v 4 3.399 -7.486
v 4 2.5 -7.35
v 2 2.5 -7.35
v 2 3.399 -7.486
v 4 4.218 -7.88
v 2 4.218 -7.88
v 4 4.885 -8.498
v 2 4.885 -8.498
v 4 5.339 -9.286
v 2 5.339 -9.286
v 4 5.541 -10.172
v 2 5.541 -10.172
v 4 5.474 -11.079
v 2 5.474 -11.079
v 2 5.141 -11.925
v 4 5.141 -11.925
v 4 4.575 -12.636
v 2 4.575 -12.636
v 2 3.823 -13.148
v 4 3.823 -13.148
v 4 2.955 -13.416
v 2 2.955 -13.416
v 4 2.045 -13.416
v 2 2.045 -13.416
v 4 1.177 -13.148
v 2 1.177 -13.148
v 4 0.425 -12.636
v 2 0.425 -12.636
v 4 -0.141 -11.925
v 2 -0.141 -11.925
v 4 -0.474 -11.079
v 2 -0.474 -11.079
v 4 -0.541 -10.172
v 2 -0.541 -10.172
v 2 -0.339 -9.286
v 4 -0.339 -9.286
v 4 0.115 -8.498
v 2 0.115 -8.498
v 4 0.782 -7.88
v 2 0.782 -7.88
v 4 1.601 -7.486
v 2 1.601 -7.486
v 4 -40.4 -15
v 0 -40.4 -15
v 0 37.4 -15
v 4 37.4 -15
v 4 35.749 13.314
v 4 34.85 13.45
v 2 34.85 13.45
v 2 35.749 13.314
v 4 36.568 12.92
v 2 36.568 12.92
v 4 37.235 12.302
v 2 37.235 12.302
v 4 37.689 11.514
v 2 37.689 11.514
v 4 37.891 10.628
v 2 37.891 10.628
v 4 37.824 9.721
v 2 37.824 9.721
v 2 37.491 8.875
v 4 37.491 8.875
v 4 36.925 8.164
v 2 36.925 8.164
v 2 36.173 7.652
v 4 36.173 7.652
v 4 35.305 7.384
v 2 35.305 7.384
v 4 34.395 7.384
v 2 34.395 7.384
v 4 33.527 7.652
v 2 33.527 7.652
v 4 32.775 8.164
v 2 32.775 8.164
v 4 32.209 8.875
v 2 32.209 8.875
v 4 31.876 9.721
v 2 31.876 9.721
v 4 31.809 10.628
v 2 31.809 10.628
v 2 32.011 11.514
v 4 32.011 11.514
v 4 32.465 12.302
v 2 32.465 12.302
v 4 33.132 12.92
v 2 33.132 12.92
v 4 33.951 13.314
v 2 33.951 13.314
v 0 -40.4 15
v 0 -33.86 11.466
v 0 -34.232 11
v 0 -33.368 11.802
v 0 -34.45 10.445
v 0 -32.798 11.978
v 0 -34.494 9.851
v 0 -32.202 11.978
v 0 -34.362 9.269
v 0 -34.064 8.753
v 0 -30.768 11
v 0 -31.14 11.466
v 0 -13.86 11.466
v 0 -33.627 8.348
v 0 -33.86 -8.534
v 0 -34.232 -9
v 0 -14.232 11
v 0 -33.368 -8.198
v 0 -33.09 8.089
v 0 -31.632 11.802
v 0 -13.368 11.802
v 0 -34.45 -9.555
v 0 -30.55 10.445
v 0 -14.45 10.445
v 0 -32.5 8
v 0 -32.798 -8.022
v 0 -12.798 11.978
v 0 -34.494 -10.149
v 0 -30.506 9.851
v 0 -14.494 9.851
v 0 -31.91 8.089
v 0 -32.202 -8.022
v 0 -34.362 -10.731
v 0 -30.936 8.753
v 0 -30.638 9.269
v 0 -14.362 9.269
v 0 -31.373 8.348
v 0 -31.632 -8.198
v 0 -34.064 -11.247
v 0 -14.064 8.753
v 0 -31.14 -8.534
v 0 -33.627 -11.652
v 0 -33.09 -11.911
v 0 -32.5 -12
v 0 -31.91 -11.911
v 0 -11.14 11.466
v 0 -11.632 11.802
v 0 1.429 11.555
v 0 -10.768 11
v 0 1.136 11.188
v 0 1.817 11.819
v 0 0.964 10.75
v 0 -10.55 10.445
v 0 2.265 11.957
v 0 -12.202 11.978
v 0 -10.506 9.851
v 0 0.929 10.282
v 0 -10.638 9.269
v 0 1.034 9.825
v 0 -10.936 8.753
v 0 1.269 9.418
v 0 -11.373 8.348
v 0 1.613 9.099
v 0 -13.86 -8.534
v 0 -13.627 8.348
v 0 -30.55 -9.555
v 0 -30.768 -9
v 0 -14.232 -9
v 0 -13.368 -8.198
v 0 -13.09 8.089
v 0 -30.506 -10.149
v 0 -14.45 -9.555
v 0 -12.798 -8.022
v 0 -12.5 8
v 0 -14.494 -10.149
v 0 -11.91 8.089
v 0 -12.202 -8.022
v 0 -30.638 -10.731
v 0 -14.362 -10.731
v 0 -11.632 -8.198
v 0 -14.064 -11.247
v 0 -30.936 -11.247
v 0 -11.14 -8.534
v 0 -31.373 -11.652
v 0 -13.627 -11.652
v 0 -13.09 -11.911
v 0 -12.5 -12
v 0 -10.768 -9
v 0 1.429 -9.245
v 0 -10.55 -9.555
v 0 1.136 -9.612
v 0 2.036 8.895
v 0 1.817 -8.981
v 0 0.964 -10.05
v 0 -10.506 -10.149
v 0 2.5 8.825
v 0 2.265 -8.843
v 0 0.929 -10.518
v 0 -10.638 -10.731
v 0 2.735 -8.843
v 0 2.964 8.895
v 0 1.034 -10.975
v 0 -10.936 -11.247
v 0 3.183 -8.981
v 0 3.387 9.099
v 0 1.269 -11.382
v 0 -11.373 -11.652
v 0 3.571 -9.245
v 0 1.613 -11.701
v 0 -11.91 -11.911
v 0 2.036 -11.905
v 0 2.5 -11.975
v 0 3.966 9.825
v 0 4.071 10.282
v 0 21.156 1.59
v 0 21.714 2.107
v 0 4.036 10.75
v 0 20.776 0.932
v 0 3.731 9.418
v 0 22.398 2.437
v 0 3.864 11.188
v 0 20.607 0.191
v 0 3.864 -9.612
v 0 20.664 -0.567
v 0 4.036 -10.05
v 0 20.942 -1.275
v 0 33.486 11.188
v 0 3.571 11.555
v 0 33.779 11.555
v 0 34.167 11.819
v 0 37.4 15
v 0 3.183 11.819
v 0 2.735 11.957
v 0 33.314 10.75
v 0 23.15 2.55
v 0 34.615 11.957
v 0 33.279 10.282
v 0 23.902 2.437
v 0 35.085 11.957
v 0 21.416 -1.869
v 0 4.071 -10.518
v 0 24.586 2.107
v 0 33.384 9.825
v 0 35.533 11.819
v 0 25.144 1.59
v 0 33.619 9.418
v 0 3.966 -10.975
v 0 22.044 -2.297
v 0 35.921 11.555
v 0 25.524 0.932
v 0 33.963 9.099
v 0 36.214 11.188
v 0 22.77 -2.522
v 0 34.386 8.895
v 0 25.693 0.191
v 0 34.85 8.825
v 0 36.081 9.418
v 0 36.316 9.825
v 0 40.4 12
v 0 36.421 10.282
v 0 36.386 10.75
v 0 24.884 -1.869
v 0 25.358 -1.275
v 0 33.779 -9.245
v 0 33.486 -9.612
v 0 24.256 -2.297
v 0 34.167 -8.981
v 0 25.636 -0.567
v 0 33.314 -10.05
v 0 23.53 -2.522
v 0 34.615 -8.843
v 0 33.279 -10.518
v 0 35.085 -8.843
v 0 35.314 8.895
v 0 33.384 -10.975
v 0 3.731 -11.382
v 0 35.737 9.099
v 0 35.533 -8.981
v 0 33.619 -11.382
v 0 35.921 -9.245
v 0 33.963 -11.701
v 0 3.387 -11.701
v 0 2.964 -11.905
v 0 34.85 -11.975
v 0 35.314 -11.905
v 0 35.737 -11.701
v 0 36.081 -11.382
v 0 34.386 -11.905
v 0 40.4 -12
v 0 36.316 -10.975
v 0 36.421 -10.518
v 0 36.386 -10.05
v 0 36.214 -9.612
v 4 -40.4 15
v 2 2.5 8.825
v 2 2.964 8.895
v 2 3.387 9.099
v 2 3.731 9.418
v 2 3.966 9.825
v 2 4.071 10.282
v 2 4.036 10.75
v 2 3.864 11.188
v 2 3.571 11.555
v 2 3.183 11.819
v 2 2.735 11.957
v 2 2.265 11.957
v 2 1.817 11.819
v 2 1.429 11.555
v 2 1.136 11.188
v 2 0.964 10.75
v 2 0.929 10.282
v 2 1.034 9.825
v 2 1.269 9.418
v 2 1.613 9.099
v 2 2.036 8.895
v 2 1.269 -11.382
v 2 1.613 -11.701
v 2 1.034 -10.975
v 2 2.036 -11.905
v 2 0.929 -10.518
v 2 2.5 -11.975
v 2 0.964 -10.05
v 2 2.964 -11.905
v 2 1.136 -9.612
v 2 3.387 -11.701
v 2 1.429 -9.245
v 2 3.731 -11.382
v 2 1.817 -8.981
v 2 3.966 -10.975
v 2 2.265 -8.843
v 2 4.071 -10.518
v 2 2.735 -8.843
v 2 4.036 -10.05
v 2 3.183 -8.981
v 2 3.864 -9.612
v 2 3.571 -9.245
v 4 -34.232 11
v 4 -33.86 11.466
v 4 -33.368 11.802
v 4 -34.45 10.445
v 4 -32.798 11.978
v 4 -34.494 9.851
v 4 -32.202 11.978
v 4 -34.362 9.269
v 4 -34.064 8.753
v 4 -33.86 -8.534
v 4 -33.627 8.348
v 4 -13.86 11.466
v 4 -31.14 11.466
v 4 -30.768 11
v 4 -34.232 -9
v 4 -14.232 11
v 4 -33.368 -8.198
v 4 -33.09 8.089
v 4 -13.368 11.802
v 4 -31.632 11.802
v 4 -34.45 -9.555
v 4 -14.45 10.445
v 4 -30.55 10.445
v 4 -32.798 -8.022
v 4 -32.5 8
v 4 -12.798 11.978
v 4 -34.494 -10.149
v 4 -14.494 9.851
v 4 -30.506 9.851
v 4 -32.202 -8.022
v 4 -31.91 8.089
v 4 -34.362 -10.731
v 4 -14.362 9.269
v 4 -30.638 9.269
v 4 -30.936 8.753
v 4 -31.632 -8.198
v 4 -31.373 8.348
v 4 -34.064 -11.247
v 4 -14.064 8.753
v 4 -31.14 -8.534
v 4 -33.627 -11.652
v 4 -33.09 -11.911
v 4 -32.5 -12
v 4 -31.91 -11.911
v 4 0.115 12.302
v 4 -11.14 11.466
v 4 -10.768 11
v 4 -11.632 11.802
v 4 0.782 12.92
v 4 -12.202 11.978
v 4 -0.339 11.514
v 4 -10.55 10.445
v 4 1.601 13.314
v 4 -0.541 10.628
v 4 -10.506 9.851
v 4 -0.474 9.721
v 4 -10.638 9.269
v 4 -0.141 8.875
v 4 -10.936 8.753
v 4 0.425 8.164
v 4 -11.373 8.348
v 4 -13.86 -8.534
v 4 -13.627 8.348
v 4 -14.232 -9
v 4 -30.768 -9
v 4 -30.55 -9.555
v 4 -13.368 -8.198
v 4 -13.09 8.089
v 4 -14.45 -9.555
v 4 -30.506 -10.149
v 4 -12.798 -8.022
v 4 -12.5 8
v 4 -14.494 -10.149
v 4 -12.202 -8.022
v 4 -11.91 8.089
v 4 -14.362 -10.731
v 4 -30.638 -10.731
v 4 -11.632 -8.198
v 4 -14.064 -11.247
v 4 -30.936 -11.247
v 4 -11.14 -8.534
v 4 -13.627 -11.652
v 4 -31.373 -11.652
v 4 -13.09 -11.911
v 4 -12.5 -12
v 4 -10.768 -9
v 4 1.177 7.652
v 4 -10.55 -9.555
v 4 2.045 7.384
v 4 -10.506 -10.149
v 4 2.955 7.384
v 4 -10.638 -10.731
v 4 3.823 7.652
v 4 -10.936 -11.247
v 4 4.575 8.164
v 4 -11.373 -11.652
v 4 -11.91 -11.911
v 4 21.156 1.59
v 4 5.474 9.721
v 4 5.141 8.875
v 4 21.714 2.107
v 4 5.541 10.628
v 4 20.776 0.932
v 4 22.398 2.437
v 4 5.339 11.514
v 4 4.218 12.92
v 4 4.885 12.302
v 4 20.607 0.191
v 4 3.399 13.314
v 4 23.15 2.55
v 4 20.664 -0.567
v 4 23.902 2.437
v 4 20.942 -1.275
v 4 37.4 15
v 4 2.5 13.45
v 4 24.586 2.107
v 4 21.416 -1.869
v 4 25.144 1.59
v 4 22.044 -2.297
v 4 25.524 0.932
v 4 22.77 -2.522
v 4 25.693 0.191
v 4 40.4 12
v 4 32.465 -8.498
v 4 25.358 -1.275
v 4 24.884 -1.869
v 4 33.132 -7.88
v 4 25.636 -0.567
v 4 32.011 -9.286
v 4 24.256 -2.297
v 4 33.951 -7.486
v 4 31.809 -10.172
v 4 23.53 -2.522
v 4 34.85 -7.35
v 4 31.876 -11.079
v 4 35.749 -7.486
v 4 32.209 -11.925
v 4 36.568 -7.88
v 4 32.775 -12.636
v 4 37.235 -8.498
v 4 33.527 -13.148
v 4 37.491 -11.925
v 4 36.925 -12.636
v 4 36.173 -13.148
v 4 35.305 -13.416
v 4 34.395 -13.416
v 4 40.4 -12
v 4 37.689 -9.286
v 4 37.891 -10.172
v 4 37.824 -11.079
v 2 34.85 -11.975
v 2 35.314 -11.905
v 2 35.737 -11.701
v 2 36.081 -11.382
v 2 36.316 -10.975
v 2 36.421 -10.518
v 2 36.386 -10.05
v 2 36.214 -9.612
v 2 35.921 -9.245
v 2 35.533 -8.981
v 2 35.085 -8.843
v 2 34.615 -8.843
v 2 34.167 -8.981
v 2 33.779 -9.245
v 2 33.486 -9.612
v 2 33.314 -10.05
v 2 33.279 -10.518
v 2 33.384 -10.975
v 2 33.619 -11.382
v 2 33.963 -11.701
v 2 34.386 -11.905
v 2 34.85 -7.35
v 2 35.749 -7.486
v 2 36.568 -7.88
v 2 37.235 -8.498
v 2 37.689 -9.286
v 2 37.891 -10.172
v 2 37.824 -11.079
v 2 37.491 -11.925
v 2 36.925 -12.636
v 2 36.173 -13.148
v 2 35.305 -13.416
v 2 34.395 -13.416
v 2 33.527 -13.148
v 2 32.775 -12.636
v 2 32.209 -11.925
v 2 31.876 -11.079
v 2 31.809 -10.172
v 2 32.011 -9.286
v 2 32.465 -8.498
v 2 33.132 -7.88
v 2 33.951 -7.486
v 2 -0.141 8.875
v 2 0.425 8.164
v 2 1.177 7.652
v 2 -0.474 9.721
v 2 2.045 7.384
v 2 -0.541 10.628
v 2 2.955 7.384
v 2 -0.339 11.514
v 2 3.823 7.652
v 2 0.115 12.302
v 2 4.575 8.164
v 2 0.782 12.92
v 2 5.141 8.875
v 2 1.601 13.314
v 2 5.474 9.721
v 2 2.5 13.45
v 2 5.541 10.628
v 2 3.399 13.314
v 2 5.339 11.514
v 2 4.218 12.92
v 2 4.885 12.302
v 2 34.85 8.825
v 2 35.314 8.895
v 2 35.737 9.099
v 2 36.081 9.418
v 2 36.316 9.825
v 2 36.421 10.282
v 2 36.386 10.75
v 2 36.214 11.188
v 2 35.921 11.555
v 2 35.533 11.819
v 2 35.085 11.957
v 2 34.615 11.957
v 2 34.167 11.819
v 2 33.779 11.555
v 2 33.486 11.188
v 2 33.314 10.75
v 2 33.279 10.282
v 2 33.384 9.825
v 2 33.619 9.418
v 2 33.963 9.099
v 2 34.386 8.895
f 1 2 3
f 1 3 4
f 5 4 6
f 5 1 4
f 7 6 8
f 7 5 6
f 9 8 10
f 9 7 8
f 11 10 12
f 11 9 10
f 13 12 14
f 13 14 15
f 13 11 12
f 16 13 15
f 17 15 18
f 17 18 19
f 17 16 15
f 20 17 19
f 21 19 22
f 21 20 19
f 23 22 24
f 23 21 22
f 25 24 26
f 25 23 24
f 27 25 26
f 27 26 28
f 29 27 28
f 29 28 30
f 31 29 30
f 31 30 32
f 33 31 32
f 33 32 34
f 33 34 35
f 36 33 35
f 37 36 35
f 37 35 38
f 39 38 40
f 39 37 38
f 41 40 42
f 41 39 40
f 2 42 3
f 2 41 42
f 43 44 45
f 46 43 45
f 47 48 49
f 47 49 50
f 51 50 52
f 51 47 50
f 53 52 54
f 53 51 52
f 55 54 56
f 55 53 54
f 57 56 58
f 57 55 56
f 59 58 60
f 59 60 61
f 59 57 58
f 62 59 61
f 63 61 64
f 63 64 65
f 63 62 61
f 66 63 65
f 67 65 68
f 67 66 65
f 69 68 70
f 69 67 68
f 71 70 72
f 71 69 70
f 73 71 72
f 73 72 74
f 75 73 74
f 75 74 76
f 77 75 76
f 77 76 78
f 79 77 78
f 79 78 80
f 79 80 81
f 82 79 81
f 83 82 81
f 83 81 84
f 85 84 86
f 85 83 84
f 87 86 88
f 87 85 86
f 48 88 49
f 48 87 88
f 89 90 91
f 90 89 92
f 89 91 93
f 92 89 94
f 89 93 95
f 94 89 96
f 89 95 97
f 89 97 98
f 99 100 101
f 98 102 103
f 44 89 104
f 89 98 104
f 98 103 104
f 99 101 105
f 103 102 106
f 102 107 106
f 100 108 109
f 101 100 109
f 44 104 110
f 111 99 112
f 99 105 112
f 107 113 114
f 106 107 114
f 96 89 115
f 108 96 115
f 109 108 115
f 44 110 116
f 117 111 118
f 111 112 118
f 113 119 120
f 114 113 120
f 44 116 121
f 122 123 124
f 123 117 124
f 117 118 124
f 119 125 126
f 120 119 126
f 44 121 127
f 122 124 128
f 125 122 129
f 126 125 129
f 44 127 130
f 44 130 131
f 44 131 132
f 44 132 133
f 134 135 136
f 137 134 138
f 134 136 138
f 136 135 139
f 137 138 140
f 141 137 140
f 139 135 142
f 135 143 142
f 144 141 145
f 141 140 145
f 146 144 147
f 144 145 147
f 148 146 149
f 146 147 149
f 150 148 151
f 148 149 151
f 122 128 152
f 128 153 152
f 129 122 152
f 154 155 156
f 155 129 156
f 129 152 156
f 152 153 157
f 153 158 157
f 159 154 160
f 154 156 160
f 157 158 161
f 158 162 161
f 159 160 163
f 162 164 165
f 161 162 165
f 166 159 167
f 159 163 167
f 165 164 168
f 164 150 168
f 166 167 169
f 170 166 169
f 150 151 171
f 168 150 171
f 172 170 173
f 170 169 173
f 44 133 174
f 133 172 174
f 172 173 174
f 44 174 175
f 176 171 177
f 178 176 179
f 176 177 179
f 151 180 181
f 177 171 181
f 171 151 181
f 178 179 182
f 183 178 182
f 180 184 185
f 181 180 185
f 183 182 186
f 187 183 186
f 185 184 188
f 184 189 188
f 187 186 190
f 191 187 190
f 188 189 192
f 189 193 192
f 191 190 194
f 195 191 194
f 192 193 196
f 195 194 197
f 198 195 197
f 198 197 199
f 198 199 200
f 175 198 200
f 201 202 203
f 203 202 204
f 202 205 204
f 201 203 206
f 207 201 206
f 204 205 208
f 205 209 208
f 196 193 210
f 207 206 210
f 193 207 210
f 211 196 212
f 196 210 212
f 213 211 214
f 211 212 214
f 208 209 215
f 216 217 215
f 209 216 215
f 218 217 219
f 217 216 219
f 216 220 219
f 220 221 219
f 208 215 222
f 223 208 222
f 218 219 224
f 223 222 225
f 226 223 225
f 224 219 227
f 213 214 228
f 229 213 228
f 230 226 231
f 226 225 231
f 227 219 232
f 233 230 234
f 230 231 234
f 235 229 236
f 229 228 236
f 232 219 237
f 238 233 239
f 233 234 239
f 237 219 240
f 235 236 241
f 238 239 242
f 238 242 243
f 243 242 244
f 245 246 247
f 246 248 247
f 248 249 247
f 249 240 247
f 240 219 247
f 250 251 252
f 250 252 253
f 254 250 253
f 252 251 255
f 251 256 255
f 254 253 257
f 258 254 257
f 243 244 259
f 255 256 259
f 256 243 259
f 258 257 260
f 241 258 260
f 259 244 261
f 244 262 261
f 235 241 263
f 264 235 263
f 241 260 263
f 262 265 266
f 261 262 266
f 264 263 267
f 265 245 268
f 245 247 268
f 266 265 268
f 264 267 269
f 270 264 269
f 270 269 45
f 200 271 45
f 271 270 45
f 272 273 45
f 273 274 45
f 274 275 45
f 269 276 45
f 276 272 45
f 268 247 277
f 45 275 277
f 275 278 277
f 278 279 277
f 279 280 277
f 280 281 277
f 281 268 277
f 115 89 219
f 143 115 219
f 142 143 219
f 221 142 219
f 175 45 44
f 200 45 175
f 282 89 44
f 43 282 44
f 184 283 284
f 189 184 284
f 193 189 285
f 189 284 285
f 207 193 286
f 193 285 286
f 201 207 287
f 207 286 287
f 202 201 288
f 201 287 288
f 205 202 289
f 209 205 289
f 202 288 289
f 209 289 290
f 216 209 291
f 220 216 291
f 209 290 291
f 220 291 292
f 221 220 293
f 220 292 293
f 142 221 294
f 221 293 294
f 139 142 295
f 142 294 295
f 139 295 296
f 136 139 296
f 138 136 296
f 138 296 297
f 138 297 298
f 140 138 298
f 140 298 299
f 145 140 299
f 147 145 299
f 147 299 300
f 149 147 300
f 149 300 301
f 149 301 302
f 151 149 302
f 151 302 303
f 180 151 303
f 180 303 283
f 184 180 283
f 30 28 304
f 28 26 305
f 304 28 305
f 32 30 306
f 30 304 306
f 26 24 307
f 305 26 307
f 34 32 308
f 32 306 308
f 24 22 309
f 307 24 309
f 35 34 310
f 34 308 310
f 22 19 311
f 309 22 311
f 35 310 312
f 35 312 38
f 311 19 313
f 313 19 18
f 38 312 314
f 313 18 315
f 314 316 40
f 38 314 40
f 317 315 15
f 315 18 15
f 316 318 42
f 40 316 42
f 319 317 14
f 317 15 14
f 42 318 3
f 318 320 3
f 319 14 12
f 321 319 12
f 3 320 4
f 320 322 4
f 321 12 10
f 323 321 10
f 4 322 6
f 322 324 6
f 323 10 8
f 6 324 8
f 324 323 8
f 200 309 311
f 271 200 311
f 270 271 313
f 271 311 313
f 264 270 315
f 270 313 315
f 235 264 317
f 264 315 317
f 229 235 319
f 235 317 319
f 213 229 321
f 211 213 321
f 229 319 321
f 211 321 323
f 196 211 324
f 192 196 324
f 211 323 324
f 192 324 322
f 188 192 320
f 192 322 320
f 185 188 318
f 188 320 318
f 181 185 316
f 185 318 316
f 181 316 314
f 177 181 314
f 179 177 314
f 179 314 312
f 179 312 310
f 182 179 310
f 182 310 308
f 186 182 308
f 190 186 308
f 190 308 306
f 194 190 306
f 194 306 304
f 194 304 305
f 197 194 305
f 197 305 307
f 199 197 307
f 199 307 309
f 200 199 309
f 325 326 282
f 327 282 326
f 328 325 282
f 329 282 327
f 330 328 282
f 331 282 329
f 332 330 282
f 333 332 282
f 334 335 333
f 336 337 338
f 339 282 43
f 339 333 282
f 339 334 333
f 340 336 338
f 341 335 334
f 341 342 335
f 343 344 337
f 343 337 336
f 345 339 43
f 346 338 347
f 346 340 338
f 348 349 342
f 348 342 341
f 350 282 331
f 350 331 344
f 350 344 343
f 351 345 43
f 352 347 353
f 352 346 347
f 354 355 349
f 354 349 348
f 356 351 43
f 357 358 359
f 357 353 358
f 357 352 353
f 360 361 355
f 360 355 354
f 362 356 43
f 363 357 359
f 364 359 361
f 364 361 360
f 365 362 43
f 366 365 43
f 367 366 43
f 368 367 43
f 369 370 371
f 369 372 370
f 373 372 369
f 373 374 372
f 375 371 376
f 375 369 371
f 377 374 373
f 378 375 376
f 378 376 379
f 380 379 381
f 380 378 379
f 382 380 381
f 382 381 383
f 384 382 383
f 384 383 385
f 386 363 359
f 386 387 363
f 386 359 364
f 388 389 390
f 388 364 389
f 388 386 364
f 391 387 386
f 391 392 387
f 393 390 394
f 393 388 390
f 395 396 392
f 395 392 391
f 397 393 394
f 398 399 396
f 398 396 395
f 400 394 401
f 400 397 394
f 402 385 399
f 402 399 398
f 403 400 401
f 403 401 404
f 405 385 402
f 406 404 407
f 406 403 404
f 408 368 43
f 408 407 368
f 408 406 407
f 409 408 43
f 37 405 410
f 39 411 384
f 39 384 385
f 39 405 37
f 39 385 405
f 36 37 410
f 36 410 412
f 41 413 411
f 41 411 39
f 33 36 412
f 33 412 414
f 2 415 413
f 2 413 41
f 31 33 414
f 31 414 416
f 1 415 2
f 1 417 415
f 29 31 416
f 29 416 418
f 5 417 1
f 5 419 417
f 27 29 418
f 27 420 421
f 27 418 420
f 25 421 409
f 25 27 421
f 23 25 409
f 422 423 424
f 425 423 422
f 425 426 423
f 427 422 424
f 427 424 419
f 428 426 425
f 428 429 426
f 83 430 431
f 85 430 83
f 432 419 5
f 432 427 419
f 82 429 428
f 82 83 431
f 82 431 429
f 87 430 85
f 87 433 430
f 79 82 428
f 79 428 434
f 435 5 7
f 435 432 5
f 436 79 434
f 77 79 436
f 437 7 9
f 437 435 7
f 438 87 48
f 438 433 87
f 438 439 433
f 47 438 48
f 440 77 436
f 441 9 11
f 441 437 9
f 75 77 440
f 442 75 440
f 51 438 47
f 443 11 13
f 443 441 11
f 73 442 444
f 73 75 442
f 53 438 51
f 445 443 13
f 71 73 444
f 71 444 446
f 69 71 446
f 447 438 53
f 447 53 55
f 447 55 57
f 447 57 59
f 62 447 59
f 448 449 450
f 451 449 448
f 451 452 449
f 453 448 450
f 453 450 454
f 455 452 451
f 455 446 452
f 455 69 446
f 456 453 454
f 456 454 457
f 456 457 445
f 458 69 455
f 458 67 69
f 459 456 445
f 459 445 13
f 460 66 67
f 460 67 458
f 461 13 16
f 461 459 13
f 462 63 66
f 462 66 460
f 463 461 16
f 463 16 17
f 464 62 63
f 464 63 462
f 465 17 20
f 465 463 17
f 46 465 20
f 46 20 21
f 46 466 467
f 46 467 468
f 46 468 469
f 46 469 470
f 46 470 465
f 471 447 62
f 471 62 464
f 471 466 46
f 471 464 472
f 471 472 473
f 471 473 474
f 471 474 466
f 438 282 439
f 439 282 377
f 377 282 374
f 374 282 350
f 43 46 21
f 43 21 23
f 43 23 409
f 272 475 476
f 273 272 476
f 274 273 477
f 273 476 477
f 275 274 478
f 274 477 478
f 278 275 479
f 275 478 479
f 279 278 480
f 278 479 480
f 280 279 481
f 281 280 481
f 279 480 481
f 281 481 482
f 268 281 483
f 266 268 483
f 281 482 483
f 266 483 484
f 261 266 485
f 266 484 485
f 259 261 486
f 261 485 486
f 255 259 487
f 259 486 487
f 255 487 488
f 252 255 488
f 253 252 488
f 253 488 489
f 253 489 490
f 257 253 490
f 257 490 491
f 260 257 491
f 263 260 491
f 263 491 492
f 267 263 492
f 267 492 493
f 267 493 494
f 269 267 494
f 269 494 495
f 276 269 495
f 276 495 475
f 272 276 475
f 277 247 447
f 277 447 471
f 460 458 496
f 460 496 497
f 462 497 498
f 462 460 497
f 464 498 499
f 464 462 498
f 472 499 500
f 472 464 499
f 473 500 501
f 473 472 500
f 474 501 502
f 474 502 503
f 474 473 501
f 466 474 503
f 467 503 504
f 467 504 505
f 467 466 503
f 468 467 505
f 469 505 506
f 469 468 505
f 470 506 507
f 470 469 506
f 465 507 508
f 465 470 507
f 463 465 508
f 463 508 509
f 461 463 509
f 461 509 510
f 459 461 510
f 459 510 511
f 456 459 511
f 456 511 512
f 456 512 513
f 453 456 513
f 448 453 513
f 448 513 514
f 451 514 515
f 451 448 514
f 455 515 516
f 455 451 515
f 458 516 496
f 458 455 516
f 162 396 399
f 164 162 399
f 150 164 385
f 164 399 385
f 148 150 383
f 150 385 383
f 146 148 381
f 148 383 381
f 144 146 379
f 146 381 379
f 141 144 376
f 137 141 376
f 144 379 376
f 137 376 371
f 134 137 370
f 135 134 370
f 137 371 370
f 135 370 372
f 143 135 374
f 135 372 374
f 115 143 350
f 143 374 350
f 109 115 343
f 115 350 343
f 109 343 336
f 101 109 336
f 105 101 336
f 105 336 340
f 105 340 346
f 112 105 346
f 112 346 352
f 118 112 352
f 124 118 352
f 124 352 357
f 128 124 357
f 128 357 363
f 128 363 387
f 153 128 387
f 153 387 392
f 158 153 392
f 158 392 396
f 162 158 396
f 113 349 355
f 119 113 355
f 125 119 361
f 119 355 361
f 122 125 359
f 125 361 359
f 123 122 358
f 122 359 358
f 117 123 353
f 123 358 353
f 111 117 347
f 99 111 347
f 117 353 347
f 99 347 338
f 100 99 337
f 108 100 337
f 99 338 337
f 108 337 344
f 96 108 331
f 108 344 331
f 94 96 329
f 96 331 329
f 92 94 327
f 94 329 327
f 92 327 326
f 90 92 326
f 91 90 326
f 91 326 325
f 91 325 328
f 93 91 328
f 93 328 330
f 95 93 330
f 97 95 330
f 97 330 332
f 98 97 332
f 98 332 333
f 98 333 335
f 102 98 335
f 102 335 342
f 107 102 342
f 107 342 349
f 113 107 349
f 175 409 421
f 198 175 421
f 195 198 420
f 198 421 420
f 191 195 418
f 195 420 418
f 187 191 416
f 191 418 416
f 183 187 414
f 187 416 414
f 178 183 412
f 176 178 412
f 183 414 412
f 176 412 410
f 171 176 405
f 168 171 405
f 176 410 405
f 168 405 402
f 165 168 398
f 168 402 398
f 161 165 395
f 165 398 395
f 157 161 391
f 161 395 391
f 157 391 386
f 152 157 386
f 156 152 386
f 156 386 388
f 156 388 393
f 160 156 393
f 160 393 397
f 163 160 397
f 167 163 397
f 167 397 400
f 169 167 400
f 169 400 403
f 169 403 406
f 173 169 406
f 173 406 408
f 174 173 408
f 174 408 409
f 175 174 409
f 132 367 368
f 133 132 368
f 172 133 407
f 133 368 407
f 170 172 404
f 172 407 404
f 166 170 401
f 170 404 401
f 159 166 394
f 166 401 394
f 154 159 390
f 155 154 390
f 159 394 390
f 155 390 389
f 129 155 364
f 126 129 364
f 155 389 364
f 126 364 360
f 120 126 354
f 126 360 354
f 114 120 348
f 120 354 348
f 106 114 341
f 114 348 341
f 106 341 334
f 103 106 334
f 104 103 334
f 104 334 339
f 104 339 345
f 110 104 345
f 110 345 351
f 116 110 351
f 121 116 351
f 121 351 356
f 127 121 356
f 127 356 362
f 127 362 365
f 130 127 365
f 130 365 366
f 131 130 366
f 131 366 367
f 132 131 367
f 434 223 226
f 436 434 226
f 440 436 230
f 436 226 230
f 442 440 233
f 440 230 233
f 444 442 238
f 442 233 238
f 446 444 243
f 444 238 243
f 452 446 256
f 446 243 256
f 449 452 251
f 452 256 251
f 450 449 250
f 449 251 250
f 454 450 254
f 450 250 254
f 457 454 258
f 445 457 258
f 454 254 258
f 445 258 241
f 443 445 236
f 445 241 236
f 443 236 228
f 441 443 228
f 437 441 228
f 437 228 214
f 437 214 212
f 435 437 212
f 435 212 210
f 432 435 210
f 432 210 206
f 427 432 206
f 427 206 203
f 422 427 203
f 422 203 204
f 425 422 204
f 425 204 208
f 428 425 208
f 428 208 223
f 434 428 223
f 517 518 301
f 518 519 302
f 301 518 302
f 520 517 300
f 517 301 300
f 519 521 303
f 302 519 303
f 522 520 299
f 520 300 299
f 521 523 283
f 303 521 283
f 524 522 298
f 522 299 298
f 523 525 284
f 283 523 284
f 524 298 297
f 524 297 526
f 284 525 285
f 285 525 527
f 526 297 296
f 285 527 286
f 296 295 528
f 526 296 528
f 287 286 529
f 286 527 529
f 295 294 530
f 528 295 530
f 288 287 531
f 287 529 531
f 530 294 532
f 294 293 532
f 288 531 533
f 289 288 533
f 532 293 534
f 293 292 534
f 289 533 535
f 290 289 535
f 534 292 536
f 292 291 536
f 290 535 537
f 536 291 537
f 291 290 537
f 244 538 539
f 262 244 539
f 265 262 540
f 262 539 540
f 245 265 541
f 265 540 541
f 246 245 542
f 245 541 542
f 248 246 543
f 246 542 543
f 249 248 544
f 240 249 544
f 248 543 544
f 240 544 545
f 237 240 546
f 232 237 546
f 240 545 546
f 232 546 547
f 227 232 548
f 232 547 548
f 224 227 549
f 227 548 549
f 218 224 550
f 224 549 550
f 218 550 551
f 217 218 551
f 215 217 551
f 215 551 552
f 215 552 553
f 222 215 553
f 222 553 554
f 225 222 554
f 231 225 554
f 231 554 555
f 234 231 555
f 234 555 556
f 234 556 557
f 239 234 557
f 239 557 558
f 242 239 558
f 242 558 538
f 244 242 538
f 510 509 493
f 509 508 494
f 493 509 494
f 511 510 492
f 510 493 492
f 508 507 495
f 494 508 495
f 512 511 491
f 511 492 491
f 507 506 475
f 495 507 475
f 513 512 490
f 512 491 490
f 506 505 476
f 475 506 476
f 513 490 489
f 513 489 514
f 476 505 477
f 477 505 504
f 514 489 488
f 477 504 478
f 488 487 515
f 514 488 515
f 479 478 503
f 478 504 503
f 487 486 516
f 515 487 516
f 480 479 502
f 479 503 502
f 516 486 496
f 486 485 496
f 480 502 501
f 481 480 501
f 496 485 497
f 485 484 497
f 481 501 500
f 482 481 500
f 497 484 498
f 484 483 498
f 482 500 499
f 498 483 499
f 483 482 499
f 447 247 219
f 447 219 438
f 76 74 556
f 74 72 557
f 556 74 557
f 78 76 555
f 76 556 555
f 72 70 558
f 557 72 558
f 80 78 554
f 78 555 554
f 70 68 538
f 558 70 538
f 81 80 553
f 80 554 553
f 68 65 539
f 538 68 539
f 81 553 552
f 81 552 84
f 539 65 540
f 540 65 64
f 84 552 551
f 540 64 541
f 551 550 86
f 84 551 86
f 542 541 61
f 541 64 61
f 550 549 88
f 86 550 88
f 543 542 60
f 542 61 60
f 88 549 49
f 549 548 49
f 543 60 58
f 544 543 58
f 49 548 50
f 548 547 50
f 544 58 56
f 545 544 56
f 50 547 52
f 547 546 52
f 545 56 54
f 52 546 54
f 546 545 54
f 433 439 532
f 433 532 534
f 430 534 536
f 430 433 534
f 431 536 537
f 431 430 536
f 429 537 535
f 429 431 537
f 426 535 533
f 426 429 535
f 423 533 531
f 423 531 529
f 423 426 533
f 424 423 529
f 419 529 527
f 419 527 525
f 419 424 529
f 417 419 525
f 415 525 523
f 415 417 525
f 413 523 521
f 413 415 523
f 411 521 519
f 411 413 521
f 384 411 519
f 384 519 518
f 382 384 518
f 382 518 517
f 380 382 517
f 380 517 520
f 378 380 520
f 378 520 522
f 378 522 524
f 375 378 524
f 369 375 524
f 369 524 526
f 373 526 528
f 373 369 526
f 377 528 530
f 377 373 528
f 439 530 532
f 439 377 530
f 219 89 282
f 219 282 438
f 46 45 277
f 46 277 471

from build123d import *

# Parameters (mm, degrees)
CROQUIS1_W              = 30
CROQUIS1_H              = 80.8
SALIENTE_EXTRUIR1_DEPTH = 4
CROQUIS3_R              = 2
CORTAR_EXTRUIR2_DEPTH   = 5
CROQUIS8_R              = 2.55
CORTAR_EXTRUIR3_DEPTH   = 5
CROQUIS10_R             = 3.05
CORTAR_EXTRUIR4_DEPTH   = 2
CROQUIS11_R             = 1.575
CORTAR_EXTRUIR5_DEPTH   = 3
CHAFL_N1_SIZE           = 3


with BuildPart() as part:
    # Croquis1 → Saliente-Extruir1 (new body)
    with BuildSketch(Plane(origin=(0, 0, 0), x_dir=(0, 0, -1), z_dir=(1, 0, 0))):
        Rectangle(CROQUIS1_W, CROQUIS1_H)
    extrude(amount=SALIENTE_EXTRUIR1_DEPTH)

    # Croquis3 → Cortar-Extruir2 (cut, through all)
    with BuildSketch(Plane(origin=(4, 0, 0), x_dir=(0, 0, -1), z_dir=(1, 0, 0))):
        with Locations((-10, -12.5)):
            Circle(CROQUIS3_R)
        with Locations((10, -12.5)):
            Circle(CROQUIS3_R)
        with Locations((-10, -32.5)):
            Circle(CROQUIS3_R)
        with Locations((10, -32.5)):
            Circle(CROQUIS3_R)
    extrude(amount=-CORTAR_EXTRUIR2_DEPTH, mode=Mode.SUBTRACT)

    # Croquis8 → Cortar-Extruir3 (cut, through all)
    with BuildSketch(Plane.ZY):
        with Locations((0, 23.15)):
            Circle(CROQUIS8_R)
    extrude(amount=-CORTAR_EXTRUIR3_DEPTH, mode=Mode.SUBTRACT)

    # Croquis10 → Cortar-Extruir4 (cut)
    with BuildSketch(Plane.ZY.offset(-4)):
        with Locations((-10.4, 34.85)):
            Circle(CROQUIS10_R)
        with Locations((10.4, 34.85)):
            Circle(CROQUIS10_R)
        with Locations((10.4, 2.5)):
            Circle(CROQUIS10_R)
        with Locations((-10.4, 2.5)):
            Circle(CROQUIS10_R)
    extrude(amount=CORTAR_EXTRUIR4_DEPTH, mode=Mode.SUBTRACT)

    # Croquis11 → Cortar-Extruir5 (cut, through all)
    with BuildSketch(Plane(origin=(2, 0, 0), x_dir=(0, 0, -1), z_dir=(1, 0, 0))):
        with Locations((-10.4, 34.85)):
            Circle(CROQUIS11_R)
        with Locations((10.4, 34.85)):
            Circle(CROQUIS11_R)
        with Locations((10.4, 2.5)):
            Circle(CROQUIS11_R)
        with Locations((-10.4, 2.5)):
            Circle(CROQUIS11_R)
    extrude(amount=-CORTAR_EXTRUIR5_DEPTH, mode=Mode.SUBTRACT)

    # Chaflán1
    chafl_n1_edges = [part.edges().sort_by_distance(p)[0] for p in [
        (2, 40.4, 15),
        (2, 40.4, -15),
    ]]
    chamfer(chafl_n1_edges, length=CHAFL_N1_SIZE)


solid = part.part
